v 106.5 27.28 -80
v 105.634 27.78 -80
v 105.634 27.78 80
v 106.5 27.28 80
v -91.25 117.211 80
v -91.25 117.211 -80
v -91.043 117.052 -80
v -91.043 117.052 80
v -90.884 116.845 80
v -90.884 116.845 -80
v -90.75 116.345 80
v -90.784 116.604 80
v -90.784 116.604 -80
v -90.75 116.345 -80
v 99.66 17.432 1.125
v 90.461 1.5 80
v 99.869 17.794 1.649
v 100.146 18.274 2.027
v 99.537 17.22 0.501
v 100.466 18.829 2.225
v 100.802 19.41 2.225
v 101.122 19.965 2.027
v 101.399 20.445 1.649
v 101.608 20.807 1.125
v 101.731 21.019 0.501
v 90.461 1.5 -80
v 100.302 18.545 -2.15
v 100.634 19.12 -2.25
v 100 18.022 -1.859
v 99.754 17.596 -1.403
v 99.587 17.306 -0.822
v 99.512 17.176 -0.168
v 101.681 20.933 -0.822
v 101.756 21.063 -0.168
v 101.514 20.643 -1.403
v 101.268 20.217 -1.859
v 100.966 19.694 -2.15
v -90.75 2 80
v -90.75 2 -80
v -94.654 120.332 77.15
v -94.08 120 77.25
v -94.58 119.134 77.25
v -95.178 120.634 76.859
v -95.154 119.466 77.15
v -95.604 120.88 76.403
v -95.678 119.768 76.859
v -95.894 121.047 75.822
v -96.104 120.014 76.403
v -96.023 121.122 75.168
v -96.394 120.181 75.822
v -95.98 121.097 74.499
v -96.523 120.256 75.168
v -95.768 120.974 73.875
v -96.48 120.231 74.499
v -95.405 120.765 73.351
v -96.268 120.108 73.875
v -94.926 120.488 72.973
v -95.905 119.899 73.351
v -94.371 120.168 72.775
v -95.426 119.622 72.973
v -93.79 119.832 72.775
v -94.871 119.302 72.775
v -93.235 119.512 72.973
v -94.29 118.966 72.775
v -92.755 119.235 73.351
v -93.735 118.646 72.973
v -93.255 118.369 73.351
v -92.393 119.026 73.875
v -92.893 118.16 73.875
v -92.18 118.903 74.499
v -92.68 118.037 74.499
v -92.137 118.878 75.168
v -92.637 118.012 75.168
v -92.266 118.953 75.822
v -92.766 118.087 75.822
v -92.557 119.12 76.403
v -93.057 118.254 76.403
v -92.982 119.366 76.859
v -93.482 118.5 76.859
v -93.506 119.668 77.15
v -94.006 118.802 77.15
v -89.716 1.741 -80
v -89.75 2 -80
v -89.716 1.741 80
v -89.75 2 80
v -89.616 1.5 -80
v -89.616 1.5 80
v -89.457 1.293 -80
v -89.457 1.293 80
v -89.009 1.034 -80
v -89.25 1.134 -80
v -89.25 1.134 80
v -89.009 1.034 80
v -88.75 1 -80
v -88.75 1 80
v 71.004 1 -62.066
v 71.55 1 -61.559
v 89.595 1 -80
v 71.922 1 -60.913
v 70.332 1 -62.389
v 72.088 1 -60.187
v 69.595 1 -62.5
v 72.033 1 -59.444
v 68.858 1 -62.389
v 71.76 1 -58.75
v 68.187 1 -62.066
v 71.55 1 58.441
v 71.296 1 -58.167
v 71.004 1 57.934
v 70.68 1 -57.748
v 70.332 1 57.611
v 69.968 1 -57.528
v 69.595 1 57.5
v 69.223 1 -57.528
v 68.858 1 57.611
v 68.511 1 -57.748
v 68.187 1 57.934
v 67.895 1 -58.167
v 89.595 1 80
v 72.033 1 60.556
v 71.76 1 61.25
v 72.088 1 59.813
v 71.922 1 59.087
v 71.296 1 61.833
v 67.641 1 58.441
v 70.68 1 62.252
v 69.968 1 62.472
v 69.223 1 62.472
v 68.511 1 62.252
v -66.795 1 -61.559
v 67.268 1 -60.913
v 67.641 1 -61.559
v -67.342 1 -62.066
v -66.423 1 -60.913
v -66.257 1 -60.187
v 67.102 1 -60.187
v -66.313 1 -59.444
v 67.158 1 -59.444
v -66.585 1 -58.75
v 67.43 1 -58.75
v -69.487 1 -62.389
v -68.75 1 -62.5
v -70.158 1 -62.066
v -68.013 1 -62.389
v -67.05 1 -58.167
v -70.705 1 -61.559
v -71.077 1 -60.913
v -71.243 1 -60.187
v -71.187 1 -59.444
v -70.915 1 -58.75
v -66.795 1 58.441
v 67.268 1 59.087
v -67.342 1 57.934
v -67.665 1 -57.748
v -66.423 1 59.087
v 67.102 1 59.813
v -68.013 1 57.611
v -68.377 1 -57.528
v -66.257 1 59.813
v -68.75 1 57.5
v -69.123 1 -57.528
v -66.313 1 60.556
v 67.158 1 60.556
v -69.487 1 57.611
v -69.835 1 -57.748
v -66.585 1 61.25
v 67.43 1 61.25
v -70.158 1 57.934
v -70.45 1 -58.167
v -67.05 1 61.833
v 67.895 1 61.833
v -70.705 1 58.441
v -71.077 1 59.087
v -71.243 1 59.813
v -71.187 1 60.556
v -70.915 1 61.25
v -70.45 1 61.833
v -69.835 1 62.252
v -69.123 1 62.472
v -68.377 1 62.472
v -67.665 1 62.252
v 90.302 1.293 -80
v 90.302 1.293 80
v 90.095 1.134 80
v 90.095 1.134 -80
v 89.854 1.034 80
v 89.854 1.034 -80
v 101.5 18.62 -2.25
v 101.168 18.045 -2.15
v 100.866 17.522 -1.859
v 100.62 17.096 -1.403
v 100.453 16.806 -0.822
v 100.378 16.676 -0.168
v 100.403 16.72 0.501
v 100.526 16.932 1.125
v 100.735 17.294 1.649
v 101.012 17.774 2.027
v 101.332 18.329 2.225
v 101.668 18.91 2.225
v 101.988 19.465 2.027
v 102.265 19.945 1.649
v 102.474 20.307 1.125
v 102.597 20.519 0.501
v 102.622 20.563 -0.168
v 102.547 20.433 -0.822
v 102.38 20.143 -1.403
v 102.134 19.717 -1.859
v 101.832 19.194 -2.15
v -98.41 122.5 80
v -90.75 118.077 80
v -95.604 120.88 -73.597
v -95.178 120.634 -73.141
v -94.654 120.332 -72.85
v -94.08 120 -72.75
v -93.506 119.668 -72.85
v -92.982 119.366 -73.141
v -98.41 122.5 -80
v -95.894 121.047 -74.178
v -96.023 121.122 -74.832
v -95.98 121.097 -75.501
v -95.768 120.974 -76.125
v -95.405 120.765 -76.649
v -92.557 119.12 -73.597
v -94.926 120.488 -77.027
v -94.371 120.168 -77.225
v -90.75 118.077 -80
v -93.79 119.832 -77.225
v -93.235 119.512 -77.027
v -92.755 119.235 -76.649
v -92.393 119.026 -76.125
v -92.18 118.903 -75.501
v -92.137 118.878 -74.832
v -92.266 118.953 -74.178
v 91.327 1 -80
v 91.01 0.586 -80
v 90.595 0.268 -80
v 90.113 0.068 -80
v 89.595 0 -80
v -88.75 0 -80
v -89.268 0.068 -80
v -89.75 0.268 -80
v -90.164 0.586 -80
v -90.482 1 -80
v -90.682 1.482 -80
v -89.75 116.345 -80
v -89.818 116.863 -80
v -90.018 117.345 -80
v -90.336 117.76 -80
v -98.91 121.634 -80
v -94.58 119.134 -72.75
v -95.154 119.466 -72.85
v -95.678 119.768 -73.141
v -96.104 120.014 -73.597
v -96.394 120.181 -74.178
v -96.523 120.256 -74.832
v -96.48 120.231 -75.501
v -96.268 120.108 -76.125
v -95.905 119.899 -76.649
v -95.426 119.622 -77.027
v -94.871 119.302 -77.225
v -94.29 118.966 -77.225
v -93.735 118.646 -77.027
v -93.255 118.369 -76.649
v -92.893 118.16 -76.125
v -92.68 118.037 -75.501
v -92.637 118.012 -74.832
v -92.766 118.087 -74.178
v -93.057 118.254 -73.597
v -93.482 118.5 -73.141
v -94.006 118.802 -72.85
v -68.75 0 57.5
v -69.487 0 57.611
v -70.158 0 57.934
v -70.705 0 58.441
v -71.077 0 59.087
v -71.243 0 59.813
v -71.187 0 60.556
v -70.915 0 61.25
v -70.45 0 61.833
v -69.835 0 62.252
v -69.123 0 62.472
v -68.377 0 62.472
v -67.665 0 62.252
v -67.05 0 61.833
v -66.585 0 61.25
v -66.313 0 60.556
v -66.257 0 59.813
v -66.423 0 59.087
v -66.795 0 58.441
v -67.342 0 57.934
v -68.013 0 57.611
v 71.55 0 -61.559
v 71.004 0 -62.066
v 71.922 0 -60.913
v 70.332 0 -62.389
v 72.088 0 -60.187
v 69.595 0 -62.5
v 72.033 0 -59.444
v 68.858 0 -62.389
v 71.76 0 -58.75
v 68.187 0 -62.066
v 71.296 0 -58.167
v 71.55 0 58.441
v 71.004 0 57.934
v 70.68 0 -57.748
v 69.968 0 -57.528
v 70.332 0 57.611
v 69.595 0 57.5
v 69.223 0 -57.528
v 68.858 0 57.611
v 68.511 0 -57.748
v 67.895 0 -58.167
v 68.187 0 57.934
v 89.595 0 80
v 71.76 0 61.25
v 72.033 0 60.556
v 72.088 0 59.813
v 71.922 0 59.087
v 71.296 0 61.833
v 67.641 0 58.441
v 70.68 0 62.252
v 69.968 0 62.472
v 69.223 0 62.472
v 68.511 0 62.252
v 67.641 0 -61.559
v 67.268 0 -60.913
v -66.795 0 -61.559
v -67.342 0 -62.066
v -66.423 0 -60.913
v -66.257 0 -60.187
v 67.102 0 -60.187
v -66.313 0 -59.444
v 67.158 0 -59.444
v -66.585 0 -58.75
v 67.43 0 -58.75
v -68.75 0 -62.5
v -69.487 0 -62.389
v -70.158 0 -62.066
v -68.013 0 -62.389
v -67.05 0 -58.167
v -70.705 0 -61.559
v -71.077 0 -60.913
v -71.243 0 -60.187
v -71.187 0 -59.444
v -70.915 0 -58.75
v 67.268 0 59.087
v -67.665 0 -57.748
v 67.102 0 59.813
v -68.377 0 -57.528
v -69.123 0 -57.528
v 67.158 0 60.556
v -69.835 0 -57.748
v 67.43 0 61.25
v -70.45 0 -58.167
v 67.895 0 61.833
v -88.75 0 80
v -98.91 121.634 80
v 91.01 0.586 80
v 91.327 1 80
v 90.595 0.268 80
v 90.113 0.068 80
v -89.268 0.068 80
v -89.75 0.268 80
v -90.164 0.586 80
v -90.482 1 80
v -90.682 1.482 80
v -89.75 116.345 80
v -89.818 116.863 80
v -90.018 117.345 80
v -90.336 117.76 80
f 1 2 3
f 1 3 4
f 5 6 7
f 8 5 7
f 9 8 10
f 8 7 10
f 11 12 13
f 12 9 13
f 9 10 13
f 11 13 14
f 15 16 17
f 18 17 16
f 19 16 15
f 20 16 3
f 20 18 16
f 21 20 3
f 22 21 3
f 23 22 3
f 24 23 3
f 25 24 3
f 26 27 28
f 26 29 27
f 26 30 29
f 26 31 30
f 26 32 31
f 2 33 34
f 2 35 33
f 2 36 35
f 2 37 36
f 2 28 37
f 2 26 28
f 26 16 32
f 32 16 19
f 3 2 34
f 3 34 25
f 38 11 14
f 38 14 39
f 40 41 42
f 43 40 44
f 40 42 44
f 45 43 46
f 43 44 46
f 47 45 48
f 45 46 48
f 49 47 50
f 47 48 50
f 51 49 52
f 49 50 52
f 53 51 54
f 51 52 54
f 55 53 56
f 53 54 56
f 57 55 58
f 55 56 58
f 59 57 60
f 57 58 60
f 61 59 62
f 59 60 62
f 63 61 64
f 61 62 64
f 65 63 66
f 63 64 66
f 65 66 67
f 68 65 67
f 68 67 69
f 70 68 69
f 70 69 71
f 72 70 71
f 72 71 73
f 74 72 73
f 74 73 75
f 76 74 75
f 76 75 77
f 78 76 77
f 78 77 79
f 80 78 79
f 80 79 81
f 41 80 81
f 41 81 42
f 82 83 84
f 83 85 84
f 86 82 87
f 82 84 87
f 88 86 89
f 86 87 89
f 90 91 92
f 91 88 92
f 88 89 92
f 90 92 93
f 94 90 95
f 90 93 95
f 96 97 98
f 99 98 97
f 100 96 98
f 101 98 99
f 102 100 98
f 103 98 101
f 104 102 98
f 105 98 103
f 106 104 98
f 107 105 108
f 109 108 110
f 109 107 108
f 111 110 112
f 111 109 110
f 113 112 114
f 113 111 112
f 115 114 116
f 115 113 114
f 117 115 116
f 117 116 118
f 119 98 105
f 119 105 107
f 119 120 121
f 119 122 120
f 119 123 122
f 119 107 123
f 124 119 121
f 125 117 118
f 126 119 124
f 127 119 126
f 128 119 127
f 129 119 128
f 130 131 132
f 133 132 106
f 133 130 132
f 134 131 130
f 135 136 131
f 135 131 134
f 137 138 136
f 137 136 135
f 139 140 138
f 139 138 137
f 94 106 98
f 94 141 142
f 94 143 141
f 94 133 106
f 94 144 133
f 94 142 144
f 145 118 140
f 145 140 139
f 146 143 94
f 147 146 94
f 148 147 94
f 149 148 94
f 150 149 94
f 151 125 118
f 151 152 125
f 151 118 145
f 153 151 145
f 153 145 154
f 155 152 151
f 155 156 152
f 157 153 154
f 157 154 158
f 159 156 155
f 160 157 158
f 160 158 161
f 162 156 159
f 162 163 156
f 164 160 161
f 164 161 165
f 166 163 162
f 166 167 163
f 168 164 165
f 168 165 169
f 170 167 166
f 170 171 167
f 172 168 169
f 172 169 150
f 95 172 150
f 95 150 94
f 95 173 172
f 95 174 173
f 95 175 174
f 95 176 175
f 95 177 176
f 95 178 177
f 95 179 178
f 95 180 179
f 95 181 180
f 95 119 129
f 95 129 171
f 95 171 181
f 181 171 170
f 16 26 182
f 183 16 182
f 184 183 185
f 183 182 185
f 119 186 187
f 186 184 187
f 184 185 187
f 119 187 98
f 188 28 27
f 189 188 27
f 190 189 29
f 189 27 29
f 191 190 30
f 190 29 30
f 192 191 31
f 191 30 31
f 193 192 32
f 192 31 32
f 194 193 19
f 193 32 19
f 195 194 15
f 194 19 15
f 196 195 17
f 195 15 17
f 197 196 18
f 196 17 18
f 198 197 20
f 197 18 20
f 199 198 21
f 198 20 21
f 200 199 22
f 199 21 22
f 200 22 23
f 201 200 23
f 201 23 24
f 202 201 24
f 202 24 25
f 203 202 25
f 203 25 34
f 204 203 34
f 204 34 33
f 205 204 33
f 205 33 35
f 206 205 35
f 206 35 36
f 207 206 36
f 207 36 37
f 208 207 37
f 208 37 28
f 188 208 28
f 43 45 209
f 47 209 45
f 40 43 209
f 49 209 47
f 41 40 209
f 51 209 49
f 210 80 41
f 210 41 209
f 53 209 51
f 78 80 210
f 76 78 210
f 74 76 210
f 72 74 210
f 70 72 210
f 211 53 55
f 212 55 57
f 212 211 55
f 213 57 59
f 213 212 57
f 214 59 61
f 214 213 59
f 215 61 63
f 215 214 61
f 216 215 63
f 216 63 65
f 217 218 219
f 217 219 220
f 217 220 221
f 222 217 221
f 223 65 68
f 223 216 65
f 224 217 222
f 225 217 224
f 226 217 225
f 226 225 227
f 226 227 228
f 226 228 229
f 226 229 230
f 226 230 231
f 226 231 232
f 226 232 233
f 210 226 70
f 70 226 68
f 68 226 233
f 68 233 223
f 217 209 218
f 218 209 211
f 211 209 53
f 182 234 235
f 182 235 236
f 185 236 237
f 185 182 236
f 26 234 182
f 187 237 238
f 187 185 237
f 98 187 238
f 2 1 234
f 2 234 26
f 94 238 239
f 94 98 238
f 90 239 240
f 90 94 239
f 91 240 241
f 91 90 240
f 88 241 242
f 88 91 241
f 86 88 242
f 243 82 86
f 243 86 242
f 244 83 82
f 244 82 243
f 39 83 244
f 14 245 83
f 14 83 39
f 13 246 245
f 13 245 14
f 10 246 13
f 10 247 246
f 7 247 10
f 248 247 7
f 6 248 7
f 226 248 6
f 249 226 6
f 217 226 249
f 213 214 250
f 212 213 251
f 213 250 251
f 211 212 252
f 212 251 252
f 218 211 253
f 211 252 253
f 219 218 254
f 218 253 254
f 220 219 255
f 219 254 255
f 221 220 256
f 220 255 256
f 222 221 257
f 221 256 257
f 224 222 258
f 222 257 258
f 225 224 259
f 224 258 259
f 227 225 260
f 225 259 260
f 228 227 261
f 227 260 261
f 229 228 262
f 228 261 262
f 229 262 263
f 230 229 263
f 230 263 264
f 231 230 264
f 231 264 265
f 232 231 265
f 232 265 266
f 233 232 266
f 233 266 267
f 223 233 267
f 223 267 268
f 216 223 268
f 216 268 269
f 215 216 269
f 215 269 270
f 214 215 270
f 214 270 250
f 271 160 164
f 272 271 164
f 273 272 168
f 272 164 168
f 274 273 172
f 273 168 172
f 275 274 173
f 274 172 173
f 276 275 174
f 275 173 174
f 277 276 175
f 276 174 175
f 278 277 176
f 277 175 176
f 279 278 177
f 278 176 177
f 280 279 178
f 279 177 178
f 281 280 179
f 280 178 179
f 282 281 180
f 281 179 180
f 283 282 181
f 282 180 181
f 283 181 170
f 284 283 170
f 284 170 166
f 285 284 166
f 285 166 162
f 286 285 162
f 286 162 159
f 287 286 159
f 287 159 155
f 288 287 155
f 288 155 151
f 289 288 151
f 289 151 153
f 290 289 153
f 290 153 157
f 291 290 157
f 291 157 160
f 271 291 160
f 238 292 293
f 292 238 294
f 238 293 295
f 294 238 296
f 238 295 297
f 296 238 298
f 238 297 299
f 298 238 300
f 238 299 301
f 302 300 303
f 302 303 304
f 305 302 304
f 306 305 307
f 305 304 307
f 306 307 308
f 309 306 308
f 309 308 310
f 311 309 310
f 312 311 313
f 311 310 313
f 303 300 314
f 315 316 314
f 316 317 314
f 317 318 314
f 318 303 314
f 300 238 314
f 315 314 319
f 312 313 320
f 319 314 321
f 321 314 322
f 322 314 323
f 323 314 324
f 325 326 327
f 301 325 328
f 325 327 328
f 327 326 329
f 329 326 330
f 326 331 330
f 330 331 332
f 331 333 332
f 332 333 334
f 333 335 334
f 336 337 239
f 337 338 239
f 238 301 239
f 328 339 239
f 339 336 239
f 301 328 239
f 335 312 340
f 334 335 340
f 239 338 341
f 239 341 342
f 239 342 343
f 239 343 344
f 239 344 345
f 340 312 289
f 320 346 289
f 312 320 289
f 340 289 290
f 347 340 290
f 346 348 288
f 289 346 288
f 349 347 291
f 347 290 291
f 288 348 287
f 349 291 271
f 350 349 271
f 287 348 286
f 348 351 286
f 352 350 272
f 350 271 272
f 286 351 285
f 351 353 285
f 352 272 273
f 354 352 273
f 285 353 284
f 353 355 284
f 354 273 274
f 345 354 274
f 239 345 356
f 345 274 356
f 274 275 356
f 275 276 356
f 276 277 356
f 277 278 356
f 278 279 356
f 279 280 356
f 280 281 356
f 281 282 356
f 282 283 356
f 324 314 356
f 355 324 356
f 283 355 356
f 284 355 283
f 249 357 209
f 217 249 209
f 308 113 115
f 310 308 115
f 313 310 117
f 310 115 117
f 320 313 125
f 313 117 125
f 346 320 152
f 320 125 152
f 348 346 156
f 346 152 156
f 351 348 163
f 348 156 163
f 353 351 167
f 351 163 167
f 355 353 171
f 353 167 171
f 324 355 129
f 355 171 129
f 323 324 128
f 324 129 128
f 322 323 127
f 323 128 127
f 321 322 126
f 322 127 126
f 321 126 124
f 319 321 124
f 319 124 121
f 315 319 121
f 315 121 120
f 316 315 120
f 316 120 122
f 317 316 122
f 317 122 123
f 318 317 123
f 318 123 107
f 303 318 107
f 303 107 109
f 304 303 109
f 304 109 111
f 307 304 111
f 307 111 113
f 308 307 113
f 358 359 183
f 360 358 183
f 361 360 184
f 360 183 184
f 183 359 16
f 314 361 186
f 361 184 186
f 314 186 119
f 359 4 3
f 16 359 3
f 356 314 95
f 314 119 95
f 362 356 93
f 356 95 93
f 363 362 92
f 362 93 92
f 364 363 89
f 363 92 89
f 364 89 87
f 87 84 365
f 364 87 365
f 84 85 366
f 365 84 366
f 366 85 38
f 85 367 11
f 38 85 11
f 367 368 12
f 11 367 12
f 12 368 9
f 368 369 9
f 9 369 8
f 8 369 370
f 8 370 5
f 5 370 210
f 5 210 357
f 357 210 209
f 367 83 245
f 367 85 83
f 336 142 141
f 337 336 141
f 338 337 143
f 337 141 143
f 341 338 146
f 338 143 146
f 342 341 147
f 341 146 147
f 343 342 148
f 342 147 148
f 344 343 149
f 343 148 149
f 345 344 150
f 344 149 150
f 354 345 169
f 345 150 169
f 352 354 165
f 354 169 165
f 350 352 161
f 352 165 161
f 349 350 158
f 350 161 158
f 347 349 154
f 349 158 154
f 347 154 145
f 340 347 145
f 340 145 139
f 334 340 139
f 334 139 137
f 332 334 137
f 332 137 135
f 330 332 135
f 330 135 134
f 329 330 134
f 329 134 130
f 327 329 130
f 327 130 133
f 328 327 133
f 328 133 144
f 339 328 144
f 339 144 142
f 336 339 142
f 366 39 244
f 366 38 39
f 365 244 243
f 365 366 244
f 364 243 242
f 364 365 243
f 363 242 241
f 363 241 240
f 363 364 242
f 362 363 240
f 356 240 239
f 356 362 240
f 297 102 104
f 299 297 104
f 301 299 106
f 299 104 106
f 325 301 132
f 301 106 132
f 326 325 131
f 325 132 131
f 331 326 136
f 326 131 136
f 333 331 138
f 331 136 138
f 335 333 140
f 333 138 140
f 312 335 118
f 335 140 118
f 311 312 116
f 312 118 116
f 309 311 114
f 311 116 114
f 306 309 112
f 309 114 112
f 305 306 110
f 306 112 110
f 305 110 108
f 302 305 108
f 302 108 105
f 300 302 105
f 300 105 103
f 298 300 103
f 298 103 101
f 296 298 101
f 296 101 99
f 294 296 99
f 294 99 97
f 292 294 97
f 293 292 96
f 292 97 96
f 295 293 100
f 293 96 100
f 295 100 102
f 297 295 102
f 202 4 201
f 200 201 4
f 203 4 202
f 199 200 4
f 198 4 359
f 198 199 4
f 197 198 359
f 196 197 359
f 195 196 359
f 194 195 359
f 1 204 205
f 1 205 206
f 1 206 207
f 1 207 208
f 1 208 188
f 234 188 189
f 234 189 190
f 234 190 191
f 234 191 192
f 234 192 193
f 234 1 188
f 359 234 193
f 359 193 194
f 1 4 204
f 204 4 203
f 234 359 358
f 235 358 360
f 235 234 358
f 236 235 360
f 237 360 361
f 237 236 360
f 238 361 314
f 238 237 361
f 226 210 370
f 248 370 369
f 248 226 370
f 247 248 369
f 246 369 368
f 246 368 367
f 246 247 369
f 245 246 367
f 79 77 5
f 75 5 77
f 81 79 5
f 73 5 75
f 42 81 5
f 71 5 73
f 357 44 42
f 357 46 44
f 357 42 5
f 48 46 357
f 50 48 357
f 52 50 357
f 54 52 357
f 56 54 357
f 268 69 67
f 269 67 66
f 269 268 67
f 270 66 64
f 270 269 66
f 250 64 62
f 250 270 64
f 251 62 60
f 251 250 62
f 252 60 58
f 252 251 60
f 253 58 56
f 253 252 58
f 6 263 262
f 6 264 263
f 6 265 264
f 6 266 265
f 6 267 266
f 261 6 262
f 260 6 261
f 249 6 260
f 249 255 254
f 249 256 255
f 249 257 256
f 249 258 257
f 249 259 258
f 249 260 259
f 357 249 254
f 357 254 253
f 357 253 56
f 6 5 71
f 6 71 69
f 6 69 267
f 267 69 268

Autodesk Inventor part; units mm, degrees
ref_plane "YZ Plane" through (0, 0, 0) normal (1, 0, 0) x (0, 1, 0)
ref_plane "XZ Plane" through (0, 0, 0) normal (0, 1, 0) x (-1, 0, 0)
ref_plane "XY Plane" through (0, 0, 0) normal (0, 0, 1) x (1, 0, 0)
sketch "Sketch1" plane through (0, 0, 0) normal (0, 1, 0) x (-1, 0, 0)
  line L0 (-90.75, 80) -> (90.75, 80)
  line L1 (90.75, 80) -> (90.75, -80)
  line L2 (90.75, -80) -> (-90.75, -80)
  line L3 (-90.75, -80) -> (-90.75, 80)
  line L4 (-90.75, 80) -> (90.75, -80) construction
  line L5 (90.75, 80) -> (-90.75, -80) construction
  point P0 (0, 0)
  dimension "d0" = 181.5
  dimension "d1" = 160
extrude "Extrusion1" add sketch "Sketch1" along normal blind 1
sketch "Sketch2" plane through (-89.75, 0, 80) normal (-1, 0, 0) x (0, -1, 0)
  line L0 (0, -160) -> (0, 0)
  line L1 (0, 0) -> (-117.5, 0)
  line L2 (-117.5, 0) -> (-117.5, -160)
  line L3 (-117.5, -160) -> (0, -160)
edge flange "Flange1" height 117.5 angle 90 thickness 1 bend radius 1 thickness toward (-1, 0, 0) relief tear relief width 1 relief depth 0.5 edges at (-90.75, 1, 0) wall of the first edge with corners at (-89.75, 0, -80) (-89.75, 0, 80) (-89.75, 117.5, 80) (-89.75, 117.5, -80)
bend "Bend1"
corner "Corner1"
sketch "Sketch3" plane through (-90.25, 116.634, 80) normal (0.5, 0.8660254, 0) x (0.8660254, -0.5, 0)
  line L0 (0, -160) -> (0, 0)
  line L1 (0, 0) -> (-10, 0)
  line L2 (-10, 0) -> (-10, -160)
  line L3 (-10, -160) -> (0, -160)
edge flange "Flange2" height 10 angle -60 thickness 1 bend radius 1 thickness toward (0.5, 0.8660254, 0) relief tear relief width 1 relief depth 0.5 edges at (-89.75, 117.5, 0) wall of the first edge with corners at (-90.25, 116.634, -80) (-90.25, 116.634, 80) (-98.9103, 121.634, 80) (-98.9103, 121.634, -80)
bend "Bend2"
corner "Corner2"
sketch "Sketch4" plane through (-98.4103, 122.5, 80) normal (0.5, 0.8660254, 0) x (0, 0, -1)
  line L0 (160, 0) -> (0, 0) projected
  line L1 (80, 0) -> (80, -5)
  line L2 (80, 0) -> (85, 0) construction
  line L3 (80, -5) -> (155, -5)
  line L4 (80, -5) -> (155, -5) construction
  line L5 (80, -5) -> (5, -5)
  line L6 (80, -5) -> (155, -5) construction
  point P0 (80, -146.4758)
  dimension "d25" = 5
  dimension "d26" = 90
  dimension "d27" = 75
  dimension "d28" = 0
  dimension "d29" = 75
  dimension "d30" = 180
hole "Hole1" at (-94.0801, 120, 75) at (-94.0801, 120, -75) direction (-0.5, -0.8660254, 0) diameter 4.5 depth 1 tip angle 118
sketch "Sketch5" plane through (89.884, 0.5, -80) normal (0.8660254, -0.5, 0) x (0.5, 0.8660254, 0)
  line L0 (0, 160) -> (0, 0)
  line L1 (0, 0) -> (31.5, 0)
  line L2 (31.5, 0) -> (31.5, 160)
  line L3 (31.5, 160) -> (0, 160)
edge flange "Flange3" height 31.5 angle 60 thickness 1 bend radius 1 thickness toward (0.8660254, -0.5, 0) relief tear relief width 1 relief depth 0.5 edges at (90.75, 1, 0) wall of the first edge with corners at (89.884, 0.5, 80) (89.884, 0.5, -80) (105.634, 27.7798, -80) (105.634, 27.7798, 80)
bend "Bend3"
corner "Corner3"
sketch "Sketch6" plane through (106.5, 27.2798, 80) normal (0.8660254, -0.5, 0) x (0, 0, -1)
  line L0 (0, 0) -> (160, 0) projected
  line L1 (80, 0) -> (80, -10)
  line L2 (80, 0) -> (90, 0) construction
  point P0 (80, -76.875)
  dimension "d48" = 10
  dimension "d49" = 90
hole "Hole3" at (101.5, 18.6195, 0) direction (-0.8660254, 0.5, 0) diameter 4.5 depth 1 tip angle 118
sketch "Sketch7" plane through (0, 0, 0) normal (0, -1, 0) x (1, 0, 0)
  line L0 (89.5953, -80) -> (89.5953, 80) projected
  line L1 (-88.75, 80) -> (89.5953, 80) projected
  line L2 (-88.75, 80) -> (-88.75, -80) projected
  line L3 (89.5953, -80) -> (-88.75, -80) projected
  line L4 (-88.75, 80) -> (-68.75, 80)
  line L5 (-88.75, 80) -> (89.5953, 80) projected
  line L6 (-68.75, 80) -> (-68.75, 60)
  line L7 (-88.75, 0) -> (89.5953, 0)
  line L8 (0.4226, 80) -> (0.4226, -80)
  point P0 (0, 0)
  point P1 (-68.75, -60)
  point P2 (69.5953, 60)
  point P3 (69.5953, -60)
  dimension "d67" = 20
  dimension "d68" = 20
hole "Hole4" at (69.5953, 0, -60) at (-68.75, 0, -60) at (-68.75, 0, 60) at (69.5953, 0, 60) direction (0, 1, 0) diameter 5 depth 1 tip angle 118
equation "\"d36\" = Thickness"
equation "\"d65\" = Thickness"
equation "\"d74\" = Thickness"
equation "\"d4\" = Thickness"
equation "\"d5\" = BendReliefWidth"
equation "\"d6\" = BendReliefDepth"
equation "\"d7\" = MinimumRemnant"
equation "\"d8\" = TransitionRadius"
equation "\"d11\" = BendRadius"
equation "\"d12\" = CornerReliefSize"
equation "\"d13\" = GapSize"
equation "\"d14\" = JacobiRadiusSize"
equation "\"d15\" = BendReliefWidth"
equation "\"d16\" = BendReliefDepth"
equation "\"d17\" = MinimumRemnant"
equation "\"d18\" = TransitionRadius"
equation "\"d21\" = BendRadius"
equation "\"d22\" = CornerReliefSize"
equation "\"d23\" = GapSize"
equation "\"d24\" = JacobiRadiusSize"
equation "\"d38\" = BendReliefWidth"
equation "\"d39\" = BendReliefDepth"
equation "\"d40\" = MinimumRemnant"
equation "\"d41\" = TransitionRadius"
equation "\"d44\" = BendRadius"
equation "\"d45\" = CornerReliefSize"
equation "\"d46\" = GapSize"
equation "\"d47\" = JacobiRadiusSize"
equation "\"BendRadius\" = Thickness"
equation "\"BendReliefWidth\" = Thickness"
equation "\"BendReliefDepth\" = 0.5 * Thickness"
equation "\"CornerReliefSize\" = 4 * Thickness"
equation "\"MinimumRemnant\" = 2 * Thickness"
equation "\"TransitionRadius\" = BendRadius"
equation "\"JacobiRadiusSize\" = BendRadius"
equation "\"GapSize\" = Thickness"
equation "\"Thickness\" = 1"
properties part number "zetdeel_hoog" material "Steel, Galvanized"
